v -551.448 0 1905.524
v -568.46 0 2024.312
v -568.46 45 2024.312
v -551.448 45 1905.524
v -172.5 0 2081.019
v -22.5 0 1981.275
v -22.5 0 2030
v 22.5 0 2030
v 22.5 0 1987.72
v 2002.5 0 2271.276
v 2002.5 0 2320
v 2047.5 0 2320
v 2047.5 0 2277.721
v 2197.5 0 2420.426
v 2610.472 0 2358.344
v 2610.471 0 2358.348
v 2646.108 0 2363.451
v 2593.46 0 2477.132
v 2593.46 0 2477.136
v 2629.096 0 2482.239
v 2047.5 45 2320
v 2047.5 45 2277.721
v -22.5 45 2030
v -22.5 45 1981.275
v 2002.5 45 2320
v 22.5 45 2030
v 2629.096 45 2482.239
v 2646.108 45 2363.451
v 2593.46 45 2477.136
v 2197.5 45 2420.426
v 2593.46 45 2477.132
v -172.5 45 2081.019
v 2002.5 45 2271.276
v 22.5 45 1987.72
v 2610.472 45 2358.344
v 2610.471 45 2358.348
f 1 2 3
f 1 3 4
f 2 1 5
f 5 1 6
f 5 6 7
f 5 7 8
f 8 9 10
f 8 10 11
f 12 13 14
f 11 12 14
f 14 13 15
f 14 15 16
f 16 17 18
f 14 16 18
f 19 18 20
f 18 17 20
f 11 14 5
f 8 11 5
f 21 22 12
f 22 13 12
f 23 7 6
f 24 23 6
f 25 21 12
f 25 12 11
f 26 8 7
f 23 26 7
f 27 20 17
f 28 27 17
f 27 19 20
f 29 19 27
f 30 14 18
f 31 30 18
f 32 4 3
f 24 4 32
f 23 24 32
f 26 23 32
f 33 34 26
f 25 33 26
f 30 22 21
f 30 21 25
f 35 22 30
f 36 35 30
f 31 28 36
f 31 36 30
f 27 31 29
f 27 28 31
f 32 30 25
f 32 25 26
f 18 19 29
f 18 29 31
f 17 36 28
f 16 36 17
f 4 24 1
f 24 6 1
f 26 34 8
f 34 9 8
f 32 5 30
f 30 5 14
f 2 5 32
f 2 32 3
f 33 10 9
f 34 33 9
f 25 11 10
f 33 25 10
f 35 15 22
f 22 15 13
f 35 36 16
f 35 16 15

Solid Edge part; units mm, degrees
sketch "Sketch1" plane through (0, 0, 0) normal (0, -1, 0) x (1, 0, 0)
  line L0 (-172.5, 2081.0185) -> (2197.5, 2420.4263)
  line L1 (2197.5, 2420.4263) -> (2593.4601, 2477.1323)
  line L2 (2593.4601, 2477.1323) -> (2610.4719, 2358.3443)
  line L3 (2610.4719, 2358.3443) -> (-551.4483, 1905.5244)
  line L4 (-568.4601, 2024.3125) -> (-551.4483, 1905.5244)
  line L5 (-172.5, 2081.0185) -> (-568.4601, 2024.3125)
extrude "Protrusion1" add sketch "Sketch1" against normal blind 45
sketch "Sketch2" plane through (1021.0059, 0, 2191.3284) normal (0, -1, 0) x (0.9899005, 0, 0.1417637)
  line L0 (1034.368, -18.1474) -> (989.8225, -11.7681)
  line L1 (989.8225, -11.7681) -> (982.9152, -59.9996)
  line L2 (982.9152, -59.9996) -> (1028.3744, -59.9996)
  line L3 (1028.3744, -59.9996) -> (1034.368, -18.1474)
  line L4 (-1011.292, -18.1472) -> (-1055.8376, -11.7678)
  line L5 (-1055.8376, -11.7678) -> (-1062.7449, -60.0004)
  line L6 (-1062.7449, -60.0004) -> (-1017.2858, -60.0004)
  line L7 (-1017.2858, -60.0004) -> (-1011.292, -18.1472)
extrude "ExtrudedCutout_1" cut sketch "Sketch2" against normal blind 99.8305
sketch "Sketch3" plane through (2601.966, 22.5, 2417.7383) normal (0.9899003, 0, 0.1417651) x (0, 1, 0)
  line L0 (-22.5, 60.0036) -> (22.5, 60.0036)
  line L1 (22.5, 60.0036) -> (22.5, -59.9964)
  line L2 (22.5, -59.9964) -> (-22.5, -59.9964)
  line L3 (-22.5, -59.9964) -> (-22.5, 60.0036)
extrude "ExtrudedProtrusion_4" add sketch "Sketch3" along normal blind 36
properties material "Wood, Pine"
